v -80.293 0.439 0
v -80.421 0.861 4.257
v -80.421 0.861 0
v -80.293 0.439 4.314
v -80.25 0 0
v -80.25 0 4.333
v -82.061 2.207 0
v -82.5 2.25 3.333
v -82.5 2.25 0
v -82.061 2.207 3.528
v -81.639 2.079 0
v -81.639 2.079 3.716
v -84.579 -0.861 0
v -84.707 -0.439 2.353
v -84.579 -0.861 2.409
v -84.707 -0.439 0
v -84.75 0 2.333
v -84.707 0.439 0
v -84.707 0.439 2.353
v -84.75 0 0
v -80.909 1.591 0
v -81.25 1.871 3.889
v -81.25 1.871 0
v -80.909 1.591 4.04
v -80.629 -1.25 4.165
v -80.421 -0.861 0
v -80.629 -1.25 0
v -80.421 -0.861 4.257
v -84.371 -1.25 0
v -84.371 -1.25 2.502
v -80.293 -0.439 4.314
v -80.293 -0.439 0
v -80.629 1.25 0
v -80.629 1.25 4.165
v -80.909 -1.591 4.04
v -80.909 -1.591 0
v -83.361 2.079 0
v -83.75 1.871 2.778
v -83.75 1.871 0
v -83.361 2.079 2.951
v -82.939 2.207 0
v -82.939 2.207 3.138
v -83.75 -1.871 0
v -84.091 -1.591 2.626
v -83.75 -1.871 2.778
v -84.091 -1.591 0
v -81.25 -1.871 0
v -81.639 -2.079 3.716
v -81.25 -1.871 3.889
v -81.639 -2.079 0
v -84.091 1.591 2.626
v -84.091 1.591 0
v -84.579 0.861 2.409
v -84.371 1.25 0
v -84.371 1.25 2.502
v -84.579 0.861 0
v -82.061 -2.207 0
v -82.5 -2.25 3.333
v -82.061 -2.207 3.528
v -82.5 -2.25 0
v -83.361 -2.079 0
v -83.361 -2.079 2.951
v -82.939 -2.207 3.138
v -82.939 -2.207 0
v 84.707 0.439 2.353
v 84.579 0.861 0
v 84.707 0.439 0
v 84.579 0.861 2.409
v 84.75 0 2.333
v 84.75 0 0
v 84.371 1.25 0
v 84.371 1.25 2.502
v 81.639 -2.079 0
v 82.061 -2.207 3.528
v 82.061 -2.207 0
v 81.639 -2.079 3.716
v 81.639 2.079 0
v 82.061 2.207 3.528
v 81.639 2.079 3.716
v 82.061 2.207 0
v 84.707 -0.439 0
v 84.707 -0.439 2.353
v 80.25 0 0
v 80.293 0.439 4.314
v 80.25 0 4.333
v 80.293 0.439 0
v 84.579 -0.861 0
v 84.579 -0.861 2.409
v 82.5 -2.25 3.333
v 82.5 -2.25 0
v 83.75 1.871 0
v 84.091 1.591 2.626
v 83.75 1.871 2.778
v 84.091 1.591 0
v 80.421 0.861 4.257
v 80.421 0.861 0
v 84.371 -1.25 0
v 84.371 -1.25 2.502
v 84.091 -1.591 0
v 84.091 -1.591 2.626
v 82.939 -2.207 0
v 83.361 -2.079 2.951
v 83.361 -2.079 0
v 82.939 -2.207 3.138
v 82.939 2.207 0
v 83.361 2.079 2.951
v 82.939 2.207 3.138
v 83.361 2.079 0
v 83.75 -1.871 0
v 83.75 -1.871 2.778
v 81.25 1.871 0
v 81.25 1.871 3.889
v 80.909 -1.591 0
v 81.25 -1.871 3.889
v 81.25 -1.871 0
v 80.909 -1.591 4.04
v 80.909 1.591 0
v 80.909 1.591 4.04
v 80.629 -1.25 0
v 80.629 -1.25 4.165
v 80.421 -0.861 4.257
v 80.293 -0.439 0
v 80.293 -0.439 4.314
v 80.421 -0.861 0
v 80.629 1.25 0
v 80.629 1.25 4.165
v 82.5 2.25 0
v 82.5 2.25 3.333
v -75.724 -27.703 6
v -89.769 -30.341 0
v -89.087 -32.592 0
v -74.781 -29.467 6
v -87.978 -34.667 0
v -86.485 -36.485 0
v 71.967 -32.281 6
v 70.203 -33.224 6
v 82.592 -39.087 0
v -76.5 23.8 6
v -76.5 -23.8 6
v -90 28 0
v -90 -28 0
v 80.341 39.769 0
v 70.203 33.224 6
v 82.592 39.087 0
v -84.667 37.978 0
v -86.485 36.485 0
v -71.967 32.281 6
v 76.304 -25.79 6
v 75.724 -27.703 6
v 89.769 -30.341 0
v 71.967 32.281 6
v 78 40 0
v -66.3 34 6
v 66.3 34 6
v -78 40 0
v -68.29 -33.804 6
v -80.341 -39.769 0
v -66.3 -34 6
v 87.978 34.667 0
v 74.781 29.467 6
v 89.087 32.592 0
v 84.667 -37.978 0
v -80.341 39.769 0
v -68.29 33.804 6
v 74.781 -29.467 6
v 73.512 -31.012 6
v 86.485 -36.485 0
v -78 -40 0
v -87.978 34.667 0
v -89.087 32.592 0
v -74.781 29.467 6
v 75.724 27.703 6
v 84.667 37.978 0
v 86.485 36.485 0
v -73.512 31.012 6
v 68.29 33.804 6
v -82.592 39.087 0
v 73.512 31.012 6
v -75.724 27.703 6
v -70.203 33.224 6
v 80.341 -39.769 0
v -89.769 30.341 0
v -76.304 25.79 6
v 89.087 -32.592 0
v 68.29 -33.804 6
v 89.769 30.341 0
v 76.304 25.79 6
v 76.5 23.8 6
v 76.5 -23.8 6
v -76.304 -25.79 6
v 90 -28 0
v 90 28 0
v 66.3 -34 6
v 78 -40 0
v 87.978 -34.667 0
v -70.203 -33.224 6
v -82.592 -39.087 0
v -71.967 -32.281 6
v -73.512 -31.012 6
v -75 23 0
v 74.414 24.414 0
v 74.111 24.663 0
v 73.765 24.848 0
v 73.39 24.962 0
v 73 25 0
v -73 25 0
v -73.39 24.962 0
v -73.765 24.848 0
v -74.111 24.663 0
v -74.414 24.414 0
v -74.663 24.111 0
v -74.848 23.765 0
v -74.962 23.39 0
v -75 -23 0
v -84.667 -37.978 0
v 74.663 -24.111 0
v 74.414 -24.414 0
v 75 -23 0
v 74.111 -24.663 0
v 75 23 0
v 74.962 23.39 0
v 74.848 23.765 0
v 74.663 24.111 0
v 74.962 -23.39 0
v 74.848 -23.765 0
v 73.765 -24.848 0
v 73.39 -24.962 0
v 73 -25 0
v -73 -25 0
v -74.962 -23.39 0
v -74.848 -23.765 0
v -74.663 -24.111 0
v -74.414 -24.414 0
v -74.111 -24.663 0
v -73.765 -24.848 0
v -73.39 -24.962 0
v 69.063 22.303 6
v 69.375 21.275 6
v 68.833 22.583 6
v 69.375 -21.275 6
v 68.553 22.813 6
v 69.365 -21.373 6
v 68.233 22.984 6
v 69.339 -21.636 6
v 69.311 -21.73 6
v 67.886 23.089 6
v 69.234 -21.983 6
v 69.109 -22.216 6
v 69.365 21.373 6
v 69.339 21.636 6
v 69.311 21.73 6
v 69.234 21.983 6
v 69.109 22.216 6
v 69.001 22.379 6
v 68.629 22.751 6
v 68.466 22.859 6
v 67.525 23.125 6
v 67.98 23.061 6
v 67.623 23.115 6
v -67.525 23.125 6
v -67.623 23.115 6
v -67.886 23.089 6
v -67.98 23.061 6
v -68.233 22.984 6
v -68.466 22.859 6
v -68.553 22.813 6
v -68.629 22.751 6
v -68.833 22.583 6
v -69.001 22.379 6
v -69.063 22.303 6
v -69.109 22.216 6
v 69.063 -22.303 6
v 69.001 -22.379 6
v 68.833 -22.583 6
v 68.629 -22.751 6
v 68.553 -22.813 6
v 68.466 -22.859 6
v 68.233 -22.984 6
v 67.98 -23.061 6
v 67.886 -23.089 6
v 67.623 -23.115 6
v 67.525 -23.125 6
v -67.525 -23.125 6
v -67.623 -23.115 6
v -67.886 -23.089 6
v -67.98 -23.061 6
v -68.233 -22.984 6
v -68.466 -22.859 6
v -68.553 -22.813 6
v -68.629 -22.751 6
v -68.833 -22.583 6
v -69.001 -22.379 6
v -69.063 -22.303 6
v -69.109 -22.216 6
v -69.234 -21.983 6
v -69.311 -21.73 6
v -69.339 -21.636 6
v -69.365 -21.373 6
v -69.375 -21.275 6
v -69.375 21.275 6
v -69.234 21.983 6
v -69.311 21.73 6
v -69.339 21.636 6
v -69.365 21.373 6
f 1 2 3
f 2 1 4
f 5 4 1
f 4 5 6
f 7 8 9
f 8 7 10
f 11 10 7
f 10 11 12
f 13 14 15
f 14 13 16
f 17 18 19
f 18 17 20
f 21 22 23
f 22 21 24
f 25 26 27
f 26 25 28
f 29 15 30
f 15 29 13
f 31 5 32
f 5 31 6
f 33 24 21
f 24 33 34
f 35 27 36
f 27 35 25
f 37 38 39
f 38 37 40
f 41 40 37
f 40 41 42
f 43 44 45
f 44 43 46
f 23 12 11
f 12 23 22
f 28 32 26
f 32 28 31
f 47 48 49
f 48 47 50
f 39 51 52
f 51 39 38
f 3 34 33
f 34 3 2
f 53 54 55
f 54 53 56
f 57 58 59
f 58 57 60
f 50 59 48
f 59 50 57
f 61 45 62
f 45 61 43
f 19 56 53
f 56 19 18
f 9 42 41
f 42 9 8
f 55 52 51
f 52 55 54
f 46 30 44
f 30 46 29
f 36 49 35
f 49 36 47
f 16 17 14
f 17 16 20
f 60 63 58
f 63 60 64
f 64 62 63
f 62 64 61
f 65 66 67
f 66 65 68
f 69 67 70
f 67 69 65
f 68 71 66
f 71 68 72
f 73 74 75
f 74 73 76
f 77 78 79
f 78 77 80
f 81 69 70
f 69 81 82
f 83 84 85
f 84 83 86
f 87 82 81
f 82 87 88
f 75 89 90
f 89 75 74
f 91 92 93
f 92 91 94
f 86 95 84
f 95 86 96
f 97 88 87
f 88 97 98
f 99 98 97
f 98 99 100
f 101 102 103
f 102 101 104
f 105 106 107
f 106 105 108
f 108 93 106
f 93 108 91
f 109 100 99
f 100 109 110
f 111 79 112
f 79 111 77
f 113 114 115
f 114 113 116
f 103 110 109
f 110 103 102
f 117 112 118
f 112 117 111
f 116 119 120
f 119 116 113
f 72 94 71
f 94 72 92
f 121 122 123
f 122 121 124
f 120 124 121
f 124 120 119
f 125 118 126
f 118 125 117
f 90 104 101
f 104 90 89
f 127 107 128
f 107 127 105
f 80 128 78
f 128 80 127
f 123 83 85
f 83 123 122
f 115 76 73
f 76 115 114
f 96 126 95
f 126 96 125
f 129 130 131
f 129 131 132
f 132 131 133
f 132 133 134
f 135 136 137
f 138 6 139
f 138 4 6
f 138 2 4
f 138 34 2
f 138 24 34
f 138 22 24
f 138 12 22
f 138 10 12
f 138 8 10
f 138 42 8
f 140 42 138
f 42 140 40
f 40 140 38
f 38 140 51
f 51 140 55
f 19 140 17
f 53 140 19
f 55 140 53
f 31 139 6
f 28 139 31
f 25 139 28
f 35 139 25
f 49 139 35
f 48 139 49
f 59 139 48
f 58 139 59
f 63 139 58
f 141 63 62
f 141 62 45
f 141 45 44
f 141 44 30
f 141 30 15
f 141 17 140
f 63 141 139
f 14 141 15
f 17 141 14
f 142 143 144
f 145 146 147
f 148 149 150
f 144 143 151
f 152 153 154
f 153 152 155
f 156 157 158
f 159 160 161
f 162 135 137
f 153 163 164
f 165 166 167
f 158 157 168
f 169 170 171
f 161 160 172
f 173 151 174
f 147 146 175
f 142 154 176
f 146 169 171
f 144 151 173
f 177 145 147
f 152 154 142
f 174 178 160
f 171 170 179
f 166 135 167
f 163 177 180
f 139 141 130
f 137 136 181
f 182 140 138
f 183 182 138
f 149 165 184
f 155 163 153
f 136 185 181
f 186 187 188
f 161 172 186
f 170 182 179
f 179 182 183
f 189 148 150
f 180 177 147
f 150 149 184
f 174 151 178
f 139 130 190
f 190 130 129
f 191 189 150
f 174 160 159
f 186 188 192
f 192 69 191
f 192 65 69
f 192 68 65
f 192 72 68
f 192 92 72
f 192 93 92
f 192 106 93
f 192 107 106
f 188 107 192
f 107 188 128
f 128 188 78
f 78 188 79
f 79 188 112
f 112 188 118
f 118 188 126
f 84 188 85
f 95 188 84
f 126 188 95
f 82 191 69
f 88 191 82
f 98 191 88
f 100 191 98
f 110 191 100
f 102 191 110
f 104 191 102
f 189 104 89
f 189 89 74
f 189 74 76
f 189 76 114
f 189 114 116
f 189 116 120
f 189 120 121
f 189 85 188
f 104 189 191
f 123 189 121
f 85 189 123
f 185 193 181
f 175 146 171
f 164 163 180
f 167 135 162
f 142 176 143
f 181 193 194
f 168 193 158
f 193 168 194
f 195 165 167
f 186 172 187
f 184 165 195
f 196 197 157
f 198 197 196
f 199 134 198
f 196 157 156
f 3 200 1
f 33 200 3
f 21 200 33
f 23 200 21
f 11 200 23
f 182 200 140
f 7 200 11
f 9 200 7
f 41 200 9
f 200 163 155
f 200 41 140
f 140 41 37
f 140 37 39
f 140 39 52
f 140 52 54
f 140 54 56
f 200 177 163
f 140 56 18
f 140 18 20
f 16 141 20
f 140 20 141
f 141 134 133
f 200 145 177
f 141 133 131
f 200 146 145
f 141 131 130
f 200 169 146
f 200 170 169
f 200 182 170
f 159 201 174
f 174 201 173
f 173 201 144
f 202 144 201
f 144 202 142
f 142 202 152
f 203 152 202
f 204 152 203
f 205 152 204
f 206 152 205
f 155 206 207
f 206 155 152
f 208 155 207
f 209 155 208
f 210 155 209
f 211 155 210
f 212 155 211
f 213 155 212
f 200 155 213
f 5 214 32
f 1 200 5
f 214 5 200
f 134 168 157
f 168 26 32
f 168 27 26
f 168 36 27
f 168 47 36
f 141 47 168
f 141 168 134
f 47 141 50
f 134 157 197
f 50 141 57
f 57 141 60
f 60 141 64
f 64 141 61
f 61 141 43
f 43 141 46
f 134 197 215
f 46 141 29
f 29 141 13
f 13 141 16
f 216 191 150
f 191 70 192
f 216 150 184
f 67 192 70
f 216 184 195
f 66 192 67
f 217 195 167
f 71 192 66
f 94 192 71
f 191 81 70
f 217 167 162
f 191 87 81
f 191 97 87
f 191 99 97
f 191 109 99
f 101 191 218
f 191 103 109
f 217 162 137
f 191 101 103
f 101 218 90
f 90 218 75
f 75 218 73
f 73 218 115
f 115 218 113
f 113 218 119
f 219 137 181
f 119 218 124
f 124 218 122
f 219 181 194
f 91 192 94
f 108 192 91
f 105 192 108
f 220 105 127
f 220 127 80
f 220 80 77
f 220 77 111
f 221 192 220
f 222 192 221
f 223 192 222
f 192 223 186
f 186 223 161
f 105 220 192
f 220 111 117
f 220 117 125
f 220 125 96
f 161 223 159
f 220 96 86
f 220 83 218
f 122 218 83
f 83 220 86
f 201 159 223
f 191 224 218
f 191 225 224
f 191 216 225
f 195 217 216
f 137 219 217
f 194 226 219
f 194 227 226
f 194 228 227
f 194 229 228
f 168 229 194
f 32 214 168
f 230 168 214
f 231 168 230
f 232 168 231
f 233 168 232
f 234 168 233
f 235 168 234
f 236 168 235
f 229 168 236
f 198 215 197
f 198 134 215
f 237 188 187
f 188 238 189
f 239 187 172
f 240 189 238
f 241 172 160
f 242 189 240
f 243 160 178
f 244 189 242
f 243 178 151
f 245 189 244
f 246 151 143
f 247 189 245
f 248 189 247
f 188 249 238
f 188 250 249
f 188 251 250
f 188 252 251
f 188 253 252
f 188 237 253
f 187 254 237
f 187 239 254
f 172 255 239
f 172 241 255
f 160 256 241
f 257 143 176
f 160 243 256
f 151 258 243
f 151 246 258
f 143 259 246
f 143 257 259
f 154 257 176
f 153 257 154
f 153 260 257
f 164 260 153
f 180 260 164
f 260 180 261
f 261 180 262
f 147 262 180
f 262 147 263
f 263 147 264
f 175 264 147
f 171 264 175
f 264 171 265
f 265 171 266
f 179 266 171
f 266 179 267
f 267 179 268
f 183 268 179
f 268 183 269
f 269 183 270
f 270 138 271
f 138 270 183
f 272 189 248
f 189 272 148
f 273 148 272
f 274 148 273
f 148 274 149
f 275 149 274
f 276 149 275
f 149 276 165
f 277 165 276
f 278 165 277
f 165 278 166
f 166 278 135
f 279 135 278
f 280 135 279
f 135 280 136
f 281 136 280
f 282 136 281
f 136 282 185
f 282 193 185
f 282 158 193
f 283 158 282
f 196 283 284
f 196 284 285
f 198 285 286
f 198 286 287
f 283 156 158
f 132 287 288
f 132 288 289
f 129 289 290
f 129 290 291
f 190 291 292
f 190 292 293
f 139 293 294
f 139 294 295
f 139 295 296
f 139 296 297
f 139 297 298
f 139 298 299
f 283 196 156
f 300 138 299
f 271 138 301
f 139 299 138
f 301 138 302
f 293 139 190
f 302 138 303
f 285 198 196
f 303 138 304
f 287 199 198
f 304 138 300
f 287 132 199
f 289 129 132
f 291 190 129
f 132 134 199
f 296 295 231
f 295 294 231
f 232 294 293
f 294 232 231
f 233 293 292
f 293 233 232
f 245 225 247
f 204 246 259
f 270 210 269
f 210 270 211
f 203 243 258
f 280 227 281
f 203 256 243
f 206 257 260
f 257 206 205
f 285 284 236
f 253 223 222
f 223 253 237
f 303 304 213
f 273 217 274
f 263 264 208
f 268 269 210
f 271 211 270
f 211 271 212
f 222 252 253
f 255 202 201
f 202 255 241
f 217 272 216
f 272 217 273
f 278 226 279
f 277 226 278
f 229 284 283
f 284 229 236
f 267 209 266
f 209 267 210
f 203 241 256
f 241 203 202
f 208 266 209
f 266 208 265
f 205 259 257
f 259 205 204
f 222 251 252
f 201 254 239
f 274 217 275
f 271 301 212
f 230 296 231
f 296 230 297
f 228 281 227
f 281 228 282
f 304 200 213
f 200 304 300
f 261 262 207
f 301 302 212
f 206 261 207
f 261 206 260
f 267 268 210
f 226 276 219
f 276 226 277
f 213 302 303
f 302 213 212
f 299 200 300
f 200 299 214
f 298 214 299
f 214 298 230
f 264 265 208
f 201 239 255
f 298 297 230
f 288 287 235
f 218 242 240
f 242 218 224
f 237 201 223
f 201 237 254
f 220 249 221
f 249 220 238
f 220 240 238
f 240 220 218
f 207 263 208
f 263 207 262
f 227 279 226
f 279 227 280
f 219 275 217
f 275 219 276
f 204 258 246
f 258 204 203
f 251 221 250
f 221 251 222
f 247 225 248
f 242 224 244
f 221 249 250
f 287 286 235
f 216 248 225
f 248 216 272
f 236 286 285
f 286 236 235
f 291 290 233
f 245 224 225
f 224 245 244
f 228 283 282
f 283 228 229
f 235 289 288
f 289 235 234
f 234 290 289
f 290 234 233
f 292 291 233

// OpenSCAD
$fn = 32;

// ----------------------------------------------------------------------
// Display bezel: 180 x 80 mm frame, opening 150x50 mm
// ----------------------------------------------------------------------

// --- parameters (mm) ---
length = 180;             // frame outside length, X
width = 80;               // frame outside width, Y
frame_w = 15;             // frame width
thickness = 6;            // frame thickness
corner_r = 12;            // outside corner radius
chamfer = 0.85;           // outer wall taper
funnel = 0.9;             // inner opening taper
opening_l = 150;          // opening length
opening_w = 50;           // opening width
inner_r = 2;              // opening corner radius
hole_d = 4.5;             // mounting screw clearance
holes_per_side = 1;       // holes per short side
hole_inset = 7.5;         // hole centre inset from the outside edge

/* rounded-rectangle outlines, generated with loops */
module rounded_ring(l_nom, w_nom, r) {
  hull() {
    for (sx = [-1, 1]) for (sy = [-1, 1])
      translate([sx * (l_nom / 2 - r), sy * (w_nom / 2 - r)]) circle(r = r);
  }
}

difference() {
  /* frame body, drafted so the outer edge is a variable-depth chamfer */
  linear_extrude(height = thickness, scale = chamfer)
    rounded_ring(length, width, corner_r);
  /* viewing opening, drafted the other way for a funnel edge */
  linear_extrude(height = thickness + 2, scale = funnel)
    translate([0, 0, -1]) rounded_ring(opening_l, opening_w, inner_r);
  /* mounting screws through the frame lands */
  for (sx = [-1, 1]) for (i = [1 : holes_per_side])
    translate([sx * (length / 2 - hole_inset),
               (i - (holes_per_side + 1) / 2) * width * 0.5, -1])
      cylinder(h = thickness + 2, d = hole_d);
}
